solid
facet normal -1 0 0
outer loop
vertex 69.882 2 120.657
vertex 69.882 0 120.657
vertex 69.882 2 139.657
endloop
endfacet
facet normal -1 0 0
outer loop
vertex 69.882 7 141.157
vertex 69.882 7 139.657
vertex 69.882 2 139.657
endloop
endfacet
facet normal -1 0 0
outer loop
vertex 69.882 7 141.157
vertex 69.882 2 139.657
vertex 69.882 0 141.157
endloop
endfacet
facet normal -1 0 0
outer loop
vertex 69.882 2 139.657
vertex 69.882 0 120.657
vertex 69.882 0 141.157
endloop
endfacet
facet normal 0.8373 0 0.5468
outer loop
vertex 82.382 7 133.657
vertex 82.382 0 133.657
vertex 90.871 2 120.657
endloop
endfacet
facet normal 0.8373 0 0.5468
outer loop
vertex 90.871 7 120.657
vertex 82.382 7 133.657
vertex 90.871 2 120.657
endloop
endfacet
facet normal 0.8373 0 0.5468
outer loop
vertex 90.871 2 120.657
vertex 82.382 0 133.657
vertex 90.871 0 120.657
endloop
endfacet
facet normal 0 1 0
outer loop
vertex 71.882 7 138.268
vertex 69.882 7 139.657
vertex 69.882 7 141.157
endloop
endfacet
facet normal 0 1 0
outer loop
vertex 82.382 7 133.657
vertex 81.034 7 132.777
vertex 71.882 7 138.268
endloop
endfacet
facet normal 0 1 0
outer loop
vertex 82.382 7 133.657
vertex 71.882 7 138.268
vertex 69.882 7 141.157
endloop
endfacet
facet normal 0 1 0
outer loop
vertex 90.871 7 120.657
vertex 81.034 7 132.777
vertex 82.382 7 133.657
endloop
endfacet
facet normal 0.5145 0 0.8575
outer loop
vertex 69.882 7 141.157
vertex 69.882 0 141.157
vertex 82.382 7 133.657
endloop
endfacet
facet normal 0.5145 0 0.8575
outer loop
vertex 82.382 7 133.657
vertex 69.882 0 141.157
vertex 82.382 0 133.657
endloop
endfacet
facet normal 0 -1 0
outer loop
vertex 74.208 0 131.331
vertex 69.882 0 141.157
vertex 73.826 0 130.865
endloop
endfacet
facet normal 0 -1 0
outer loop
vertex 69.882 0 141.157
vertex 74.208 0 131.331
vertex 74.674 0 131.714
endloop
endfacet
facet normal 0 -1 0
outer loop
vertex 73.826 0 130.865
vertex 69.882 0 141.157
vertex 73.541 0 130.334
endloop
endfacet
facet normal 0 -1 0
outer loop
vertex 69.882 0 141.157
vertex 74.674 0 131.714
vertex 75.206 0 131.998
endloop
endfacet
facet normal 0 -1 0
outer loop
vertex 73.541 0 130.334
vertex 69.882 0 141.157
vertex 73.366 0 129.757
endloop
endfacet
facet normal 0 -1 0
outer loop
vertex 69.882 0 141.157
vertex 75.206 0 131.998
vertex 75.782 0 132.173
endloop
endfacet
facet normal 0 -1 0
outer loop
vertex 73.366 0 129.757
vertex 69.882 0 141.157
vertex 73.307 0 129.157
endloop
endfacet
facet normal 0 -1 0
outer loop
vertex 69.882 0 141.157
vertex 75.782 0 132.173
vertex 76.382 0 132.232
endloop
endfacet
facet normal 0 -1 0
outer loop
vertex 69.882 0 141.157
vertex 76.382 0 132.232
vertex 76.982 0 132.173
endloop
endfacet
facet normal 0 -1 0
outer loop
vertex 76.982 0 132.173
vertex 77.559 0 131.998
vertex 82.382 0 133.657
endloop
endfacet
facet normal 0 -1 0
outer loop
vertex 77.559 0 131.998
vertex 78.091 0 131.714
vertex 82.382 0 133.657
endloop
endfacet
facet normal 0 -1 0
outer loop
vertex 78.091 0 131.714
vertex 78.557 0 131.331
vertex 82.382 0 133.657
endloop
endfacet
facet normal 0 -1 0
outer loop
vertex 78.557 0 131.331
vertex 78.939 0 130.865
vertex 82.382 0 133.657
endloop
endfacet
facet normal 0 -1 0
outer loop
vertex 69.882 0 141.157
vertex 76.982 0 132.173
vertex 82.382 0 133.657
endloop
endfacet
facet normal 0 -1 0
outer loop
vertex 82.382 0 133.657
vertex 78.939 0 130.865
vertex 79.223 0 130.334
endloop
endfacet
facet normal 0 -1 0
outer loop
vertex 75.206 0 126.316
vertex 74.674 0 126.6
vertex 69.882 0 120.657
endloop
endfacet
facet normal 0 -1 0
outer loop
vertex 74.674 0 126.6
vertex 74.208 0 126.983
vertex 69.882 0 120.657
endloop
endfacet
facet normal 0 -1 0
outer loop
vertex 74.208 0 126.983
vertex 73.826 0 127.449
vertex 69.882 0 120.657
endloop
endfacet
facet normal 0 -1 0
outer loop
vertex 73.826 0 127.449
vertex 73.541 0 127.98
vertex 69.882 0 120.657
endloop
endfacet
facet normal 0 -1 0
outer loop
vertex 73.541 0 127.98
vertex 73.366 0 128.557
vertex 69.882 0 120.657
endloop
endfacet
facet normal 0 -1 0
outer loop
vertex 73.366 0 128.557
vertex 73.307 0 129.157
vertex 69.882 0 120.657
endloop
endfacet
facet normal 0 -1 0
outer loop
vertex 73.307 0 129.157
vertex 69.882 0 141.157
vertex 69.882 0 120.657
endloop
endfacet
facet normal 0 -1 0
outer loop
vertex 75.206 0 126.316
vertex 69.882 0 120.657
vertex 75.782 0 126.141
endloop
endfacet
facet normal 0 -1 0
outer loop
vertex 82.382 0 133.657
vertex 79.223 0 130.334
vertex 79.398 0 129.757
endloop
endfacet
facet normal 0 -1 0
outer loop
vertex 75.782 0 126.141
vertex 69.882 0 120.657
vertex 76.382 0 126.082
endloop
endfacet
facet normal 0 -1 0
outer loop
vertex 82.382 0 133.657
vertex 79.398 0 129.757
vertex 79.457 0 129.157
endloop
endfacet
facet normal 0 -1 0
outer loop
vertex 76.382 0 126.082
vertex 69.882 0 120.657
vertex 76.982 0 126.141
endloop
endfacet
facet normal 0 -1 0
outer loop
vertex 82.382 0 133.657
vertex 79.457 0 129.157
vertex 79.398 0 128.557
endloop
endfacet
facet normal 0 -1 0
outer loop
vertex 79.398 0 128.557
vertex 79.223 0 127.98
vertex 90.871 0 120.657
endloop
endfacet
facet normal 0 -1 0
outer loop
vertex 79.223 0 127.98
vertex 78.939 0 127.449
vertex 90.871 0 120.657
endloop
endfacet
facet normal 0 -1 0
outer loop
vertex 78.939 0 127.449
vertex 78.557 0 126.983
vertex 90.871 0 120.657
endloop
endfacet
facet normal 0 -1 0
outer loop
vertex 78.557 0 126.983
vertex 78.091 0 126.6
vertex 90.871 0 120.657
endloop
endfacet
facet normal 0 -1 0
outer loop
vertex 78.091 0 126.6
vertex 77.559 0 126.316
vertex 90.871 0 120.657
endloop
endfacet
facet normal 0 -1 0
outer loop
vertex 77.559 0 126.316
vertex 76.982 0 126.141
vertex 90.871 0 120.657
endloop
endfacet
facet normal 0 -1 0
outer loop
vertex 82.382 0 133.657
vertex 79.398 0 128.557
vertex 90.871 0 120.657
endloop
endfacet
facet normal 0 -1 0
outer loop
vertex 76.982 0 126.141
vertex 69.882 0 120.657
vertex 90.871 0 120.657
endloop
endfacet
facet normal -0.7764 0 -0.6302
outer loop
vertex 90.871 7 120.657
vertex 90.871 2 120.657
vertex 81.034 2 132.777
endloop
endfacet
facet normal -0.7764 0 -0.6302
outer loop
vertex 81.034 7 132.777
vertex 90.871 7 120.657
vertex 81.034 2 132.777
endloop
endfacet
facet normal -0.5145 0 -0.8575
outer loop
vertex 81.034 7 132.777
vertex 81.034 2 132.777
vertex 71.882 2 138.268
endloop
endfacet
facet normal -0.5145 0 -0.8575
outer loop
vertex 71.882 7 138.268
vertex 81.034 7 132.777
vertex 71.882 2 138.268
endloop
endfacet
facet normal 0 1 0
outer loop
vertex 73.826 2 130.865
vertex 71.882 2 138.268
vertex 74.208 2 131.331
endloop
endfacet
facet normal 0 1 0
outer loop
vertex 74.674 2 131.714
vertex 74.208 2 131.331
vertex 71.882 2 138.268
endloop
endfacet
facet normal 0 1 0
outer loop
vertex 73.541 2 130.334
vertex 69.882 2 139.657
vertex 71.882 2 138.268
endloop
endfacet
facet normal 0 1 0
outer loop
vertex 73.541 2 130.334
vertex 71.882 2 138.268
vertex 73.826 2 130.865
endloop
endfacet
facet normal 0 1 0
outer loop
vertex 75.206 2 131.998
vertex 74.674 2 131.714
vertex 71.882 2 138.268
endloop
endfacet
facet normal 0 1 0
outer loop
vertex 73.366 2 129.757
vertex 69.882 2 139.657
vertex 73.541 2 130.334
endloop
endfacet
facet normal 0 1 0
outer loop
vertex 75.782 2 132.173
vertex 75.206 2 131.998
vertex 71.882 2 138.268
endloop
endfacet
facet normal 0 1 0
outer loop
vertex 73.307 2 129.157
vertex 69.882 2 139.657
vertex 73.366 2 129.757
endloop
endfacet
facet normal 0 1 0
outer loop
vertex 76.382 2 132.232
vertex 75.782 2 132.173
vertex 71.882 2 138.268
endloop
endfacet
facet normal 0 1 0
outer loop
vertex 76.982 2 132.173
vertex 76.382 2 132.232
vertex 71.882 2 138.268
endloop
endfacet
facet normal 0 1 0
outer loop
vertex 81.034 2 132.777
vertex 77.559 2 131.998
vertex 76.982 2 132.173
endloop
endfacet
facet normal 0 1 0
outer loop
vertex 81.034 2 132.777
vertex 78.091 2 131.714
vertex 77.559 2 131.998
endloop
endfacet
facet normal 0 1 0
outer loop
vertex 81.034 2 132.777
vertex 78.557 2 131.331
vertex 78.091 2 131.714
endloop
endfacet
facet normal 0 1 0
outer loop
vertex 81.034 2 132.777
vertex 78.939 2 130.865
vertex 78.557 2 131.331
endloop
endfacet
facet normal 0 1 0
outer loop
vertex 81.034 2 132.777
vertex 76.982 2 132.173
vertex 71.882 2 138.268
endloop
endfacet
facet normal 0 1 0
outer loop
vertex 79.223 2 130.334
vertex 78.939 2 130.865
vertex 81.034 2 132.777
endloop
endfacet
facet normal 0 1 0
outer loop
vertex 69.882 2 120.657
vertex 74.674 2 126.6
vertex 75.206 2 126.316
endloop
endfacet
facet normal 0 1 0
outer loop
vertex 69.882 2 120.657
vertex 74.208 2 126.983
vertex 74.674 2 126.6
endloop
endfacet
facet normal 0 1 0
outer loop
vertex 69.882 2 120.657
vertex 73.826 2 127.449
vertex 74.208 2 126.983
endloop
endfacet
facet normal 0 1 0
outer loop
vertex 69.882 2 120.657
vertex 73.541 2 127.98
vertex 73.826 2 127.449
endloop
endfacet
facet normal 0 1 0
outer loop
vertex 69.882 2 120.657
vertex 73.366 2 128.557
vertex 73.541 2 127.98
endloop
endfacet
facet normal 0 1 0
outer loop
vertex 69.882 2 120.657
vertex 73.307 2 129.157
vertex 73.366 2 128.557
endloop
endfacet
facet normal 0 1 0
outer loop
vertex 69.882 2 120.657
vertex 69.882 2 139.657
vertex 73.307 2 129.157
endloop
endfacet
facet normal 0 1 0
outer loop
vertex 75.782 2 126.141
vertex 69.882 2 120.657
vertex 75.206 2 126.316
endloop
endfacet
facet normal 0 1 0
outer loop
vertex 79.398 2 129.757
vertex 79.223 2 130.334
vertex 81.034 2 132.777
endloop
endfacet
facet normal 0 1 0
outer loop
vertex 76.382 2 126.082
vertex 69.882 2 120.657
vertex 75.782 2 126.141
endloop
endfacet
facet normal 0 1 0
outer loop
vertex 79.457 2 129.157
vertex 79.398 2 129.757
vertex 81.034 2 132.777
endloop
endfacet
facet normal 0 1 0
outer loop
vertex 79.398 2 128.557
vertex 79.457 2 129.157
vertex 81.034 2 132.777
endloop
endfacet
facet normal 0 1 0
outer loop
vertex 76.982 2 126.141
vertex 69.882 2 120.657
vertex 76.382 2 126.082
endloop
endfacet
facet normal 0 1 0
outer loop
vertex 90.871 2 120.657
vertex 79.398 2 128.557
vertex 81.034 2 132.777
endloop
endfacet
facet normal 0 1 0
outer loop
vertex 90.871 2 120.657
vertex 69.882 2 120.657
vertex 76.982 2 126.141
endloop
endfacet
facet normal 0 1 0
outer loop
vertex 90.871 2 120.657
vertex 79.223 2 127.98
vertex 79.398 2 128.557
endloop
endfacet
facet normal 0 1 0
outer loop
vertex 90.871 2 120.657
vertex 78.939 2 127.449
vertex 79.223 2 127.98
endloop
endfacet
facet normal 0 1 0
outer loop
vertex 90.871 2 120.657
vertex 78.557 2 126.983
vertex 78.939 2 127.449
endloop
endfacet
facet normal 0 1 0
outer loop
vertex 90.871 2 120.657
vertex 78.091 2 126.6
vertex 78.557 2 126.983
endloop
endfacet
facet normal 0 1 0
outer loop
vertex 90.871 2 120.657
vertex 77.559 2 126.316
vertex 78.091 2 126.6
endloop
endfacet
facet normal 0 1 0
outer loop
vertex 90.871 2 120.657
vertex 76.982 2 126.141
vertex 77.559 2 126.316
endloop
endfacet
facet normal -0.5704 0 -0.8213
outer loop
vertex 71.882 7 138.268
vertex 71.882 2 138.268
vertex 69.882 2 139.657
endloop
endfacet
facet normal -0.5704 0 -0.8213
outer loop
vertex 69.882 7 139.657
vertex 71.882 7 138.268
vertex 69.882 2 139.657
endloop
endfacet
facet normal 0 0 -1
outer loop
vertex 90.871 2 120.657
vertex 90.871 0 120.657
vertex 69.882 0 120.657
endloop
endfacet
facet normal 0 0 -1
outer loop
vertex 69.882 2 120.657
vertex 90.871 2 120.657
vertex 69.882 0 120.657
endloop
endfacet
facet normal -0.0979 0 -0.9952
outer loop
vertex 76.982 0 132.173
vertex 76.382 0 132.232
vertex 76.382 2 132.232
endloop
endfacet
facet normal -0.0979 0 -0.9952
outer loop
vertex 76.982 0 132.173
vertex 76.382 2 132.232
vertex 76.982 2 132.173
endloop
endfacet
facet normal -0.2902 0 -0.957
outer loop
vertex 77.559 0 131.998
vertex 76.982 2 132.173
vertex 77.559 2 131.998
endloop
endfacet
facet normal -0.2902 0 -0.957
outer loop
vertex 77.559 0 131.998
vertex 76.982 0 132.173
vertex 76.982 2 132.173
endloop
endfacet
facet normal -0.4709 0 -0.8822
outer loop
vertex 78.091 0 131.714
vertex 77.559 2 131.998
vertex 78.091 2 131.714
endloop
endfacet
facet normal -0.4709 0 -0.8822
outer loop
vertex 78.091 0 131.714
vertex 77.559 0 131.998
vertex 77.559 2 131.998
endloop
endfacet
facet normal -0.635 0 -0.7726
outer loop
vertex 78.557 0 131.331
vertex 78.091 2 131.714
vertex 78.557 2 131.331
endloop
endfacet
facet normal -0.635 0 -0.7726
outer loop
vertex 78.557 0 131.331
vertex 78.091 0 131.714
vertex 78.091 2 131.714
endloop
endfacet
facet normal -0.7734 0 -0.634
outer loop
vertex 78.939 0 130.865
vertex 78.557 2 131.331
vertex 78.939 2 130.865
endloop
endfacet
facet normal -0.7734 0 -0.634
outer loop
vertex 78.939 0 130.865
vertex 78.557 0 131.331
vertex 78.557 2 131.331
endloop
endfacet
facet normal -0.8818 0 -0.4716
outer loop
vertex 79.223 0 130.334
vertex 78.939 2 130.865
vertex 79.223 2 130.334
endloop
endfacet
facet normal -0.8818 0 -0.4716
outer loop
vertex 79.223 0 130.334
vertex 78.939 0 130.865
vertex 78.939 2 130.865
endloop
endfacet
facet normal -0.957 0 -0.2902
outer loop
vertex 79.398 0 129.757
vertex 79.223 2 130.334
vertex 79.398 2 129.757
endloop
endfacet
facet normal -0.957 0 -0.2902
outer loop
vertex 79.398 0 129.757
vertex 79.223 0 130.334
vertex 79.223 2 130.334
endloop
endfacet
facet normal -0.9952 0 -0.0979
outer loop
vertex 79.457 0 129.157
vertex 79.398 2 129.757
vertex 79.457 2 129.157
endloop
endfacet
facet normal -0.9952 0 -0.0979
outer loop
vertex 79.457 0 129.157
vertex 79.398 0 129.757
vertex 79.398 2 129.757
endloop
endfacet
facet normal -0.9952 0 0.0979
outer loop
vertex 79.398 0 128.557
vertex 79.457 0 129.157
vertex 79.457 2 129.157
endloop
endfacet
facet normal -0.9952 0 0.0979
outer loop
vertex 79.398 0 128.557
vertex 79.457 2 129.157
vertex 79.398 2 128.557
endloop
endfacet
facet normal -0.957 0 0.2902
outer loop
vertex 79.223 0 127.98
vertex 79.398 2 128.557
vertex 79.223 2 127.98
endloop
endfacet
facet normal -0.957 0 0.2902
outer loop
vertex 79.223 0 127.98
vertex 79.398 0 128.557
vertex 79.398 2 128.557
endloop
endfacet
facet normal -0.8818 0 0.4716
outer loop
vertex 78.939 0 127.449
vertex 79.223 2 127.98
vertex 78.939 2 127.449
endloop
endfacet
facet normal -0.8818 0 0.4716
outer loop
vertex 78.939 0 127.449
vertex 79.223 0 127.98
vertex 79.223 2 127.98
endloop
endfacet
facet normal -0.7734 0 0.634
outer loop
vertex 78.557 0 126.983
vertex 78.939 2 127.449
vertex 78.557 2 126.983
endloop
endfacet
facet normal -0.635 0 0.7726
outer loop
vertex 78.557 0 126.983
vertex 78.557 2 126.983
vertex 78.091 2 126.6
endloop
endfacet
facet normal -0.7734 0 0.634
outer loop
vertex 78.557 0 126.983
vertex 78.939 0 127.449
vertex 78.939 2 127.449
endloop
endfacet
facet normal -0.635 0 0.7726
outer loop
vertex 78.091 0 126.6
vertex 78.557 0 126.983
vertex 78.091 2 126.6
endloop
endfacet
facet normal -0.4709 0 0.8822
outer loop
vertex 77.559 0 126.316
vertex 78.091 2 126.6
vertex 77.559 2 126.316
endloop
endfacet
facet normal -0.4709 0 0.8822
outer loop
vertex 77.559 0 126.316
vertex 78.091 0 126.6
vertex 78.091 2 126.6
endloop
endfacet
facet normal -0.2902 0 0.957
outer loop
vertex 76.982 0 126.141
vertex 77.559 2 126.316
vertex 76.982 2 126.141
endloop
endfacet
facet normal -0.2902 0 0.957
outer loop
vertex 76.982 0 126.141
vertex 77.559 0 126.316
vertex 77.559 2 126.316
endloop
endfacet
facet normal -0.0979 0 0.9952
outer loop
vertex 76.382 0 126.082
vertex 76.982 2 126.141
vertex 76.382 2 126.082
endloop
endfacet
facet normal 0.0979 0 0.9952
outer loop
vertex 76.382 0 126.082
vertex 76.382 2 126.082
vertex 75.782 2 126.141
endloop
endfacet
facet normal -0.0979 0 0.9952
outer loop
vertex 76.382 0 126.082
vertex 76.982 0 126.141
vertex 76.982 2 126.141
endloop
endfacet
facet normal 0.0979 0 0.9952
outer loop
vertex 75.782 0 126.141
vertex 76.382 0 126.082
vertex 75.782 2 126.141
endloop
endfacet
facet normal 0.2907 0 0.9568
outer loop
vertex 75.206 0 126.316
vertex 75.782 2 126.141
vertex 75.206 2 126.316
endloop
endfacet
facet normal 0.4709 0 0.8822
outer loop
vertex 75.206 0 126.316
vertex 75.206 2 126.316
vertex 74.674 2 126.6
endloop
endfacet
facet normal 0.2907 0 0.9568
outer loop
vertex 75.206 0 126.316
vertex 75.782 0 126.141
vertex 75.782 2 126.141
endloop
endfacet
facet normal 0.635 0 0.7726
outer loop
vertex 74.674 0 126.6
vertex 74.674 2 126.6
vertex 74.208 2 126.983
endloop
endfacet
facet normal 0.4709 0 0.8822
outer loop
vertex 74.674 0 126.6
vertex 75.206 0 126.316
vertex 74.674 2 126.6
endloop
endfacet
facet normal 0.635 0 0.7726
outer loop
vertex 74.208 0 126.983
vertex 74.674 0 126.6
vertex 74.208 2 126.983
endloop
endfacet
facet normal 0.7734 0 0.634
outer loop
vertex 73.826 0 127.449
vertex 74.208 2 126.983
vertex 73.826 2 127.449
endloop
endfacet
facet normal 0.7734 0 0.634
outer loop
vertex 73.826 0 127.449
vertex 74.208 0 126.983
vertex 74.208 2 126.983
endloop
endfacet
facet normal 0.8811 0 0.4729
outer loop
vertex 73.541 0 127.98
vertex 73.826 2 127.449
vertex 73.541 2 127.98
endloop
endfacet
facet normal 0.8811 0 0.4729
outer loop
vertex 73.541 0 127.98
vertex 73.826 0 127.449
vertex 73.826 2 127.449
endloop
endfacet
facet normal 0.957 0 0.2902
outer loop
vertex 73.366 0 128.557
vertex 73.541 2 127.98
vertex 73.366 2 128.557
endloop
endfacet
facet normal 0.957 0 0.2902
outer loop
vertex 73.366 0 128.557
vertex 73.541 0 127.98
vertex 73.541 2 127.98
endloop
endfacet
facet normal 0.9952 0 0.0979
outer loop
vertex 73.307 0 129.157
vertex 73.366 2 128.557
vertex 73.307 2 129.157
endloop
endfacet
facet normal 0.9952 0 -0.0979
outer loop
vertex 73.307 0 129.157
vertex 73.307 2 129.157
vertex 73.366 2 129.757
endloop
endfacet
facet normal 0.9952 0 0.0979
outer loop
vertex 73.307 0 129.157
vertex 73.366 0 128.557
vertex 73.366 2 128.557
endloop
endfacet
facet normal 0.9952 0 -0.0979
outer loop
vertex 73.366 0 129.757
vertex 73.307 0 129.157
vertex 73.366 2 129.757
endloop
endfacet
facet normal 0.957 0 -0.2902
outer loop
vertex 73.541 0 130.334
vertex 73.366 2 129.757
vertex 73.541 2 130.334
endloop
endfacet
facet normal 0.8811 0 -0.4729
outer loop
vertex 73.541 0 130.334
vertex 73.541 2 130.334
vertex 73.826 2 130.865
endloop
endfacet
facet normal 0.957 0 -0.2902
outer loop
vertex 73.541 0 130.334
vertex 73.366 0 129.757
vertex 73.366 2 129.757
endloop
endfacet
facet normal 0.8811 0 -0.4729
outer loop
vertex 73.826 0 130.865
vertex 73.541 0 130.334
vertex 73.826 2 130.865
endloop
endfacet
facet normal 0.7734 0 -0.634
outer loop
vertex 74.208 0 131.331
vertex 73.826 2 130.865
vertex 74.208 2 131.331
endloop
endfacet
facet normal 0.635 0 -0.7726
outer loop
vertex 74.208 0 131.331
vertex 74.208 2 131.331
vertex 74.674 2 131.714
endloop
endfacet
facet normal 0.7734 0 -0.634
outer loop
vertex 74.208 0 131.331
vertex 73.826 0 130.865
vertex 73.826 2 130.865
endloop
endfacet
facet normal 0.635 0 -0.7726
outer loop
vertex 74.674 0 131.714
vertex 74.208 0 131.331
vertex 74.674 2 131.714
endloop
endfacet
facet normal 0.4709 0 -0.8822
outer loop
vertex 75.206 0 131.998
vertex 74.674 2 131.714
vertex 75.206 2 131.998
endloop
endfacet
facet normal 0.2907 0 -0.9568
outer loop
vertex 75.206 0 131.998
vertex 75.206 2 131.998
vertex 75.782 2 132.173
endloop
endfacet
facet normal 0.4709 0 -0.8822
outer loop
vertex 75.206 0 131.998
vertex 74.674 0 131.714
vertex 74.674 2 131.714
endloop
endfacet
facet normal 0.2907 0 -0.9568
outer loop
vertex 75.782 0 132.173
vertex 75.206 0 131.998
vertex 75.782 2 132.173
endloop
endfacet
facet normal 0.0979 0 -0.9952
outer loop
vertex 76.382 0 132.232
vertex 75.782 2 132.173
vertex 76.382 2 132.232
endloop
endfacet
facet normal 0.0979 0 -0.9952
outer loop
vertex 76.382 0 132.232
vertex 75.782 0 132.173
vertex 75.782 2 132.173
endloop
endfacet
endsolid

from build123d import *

# Parameters (mm, degrees)
SKETCH1_R           = 3.075
BOSS_EXTRUDE1_DEPTH = 2
BOSS_EXTRUDE2_DEPTH = 7


with BuildPart() as part:
    # Sketch1 → Boss-Extrude1 (new body)
    with BuildSketch(Plane(origin=(0, 0, 0), x_dir=(1, 0, 0), z_dir=(0, 1, 0))):
        Polygon((69.882295615, -141.15690287), (82.382295615, -133.65690287), (90.871460172, -120.65690287), (69.882295615, -120.65690287), align=None)
        with Locations(Location((76.382295615, -129.15690287, 0), (0, 0, 270))):
            Circle(SKETCH1_R, mode=Mode.SUBTRACT)
    extrude(amount=BOSS_EXTRUDE1_DEPTH)

    # Sketch2 → Boss-Extrude2 (add)
    with BuildSketch(Plane(origin=(0, 0, 0), x_dir=(-1, 0, 0), z_dir=(0, -1, 0))):
        Polygon((-69.882295615, -141.15690287), (-82.382295615, -133.65690287), (-90.871460172, -120.65690287), (-81.03443504, -132.776732853), (-71.882295615, -138.268016507), (-69.882295615, -139.65690287), align=None)
    extrude(amount=-BOSS_EXTRUDE2_DEPTH)


solid = part.part
